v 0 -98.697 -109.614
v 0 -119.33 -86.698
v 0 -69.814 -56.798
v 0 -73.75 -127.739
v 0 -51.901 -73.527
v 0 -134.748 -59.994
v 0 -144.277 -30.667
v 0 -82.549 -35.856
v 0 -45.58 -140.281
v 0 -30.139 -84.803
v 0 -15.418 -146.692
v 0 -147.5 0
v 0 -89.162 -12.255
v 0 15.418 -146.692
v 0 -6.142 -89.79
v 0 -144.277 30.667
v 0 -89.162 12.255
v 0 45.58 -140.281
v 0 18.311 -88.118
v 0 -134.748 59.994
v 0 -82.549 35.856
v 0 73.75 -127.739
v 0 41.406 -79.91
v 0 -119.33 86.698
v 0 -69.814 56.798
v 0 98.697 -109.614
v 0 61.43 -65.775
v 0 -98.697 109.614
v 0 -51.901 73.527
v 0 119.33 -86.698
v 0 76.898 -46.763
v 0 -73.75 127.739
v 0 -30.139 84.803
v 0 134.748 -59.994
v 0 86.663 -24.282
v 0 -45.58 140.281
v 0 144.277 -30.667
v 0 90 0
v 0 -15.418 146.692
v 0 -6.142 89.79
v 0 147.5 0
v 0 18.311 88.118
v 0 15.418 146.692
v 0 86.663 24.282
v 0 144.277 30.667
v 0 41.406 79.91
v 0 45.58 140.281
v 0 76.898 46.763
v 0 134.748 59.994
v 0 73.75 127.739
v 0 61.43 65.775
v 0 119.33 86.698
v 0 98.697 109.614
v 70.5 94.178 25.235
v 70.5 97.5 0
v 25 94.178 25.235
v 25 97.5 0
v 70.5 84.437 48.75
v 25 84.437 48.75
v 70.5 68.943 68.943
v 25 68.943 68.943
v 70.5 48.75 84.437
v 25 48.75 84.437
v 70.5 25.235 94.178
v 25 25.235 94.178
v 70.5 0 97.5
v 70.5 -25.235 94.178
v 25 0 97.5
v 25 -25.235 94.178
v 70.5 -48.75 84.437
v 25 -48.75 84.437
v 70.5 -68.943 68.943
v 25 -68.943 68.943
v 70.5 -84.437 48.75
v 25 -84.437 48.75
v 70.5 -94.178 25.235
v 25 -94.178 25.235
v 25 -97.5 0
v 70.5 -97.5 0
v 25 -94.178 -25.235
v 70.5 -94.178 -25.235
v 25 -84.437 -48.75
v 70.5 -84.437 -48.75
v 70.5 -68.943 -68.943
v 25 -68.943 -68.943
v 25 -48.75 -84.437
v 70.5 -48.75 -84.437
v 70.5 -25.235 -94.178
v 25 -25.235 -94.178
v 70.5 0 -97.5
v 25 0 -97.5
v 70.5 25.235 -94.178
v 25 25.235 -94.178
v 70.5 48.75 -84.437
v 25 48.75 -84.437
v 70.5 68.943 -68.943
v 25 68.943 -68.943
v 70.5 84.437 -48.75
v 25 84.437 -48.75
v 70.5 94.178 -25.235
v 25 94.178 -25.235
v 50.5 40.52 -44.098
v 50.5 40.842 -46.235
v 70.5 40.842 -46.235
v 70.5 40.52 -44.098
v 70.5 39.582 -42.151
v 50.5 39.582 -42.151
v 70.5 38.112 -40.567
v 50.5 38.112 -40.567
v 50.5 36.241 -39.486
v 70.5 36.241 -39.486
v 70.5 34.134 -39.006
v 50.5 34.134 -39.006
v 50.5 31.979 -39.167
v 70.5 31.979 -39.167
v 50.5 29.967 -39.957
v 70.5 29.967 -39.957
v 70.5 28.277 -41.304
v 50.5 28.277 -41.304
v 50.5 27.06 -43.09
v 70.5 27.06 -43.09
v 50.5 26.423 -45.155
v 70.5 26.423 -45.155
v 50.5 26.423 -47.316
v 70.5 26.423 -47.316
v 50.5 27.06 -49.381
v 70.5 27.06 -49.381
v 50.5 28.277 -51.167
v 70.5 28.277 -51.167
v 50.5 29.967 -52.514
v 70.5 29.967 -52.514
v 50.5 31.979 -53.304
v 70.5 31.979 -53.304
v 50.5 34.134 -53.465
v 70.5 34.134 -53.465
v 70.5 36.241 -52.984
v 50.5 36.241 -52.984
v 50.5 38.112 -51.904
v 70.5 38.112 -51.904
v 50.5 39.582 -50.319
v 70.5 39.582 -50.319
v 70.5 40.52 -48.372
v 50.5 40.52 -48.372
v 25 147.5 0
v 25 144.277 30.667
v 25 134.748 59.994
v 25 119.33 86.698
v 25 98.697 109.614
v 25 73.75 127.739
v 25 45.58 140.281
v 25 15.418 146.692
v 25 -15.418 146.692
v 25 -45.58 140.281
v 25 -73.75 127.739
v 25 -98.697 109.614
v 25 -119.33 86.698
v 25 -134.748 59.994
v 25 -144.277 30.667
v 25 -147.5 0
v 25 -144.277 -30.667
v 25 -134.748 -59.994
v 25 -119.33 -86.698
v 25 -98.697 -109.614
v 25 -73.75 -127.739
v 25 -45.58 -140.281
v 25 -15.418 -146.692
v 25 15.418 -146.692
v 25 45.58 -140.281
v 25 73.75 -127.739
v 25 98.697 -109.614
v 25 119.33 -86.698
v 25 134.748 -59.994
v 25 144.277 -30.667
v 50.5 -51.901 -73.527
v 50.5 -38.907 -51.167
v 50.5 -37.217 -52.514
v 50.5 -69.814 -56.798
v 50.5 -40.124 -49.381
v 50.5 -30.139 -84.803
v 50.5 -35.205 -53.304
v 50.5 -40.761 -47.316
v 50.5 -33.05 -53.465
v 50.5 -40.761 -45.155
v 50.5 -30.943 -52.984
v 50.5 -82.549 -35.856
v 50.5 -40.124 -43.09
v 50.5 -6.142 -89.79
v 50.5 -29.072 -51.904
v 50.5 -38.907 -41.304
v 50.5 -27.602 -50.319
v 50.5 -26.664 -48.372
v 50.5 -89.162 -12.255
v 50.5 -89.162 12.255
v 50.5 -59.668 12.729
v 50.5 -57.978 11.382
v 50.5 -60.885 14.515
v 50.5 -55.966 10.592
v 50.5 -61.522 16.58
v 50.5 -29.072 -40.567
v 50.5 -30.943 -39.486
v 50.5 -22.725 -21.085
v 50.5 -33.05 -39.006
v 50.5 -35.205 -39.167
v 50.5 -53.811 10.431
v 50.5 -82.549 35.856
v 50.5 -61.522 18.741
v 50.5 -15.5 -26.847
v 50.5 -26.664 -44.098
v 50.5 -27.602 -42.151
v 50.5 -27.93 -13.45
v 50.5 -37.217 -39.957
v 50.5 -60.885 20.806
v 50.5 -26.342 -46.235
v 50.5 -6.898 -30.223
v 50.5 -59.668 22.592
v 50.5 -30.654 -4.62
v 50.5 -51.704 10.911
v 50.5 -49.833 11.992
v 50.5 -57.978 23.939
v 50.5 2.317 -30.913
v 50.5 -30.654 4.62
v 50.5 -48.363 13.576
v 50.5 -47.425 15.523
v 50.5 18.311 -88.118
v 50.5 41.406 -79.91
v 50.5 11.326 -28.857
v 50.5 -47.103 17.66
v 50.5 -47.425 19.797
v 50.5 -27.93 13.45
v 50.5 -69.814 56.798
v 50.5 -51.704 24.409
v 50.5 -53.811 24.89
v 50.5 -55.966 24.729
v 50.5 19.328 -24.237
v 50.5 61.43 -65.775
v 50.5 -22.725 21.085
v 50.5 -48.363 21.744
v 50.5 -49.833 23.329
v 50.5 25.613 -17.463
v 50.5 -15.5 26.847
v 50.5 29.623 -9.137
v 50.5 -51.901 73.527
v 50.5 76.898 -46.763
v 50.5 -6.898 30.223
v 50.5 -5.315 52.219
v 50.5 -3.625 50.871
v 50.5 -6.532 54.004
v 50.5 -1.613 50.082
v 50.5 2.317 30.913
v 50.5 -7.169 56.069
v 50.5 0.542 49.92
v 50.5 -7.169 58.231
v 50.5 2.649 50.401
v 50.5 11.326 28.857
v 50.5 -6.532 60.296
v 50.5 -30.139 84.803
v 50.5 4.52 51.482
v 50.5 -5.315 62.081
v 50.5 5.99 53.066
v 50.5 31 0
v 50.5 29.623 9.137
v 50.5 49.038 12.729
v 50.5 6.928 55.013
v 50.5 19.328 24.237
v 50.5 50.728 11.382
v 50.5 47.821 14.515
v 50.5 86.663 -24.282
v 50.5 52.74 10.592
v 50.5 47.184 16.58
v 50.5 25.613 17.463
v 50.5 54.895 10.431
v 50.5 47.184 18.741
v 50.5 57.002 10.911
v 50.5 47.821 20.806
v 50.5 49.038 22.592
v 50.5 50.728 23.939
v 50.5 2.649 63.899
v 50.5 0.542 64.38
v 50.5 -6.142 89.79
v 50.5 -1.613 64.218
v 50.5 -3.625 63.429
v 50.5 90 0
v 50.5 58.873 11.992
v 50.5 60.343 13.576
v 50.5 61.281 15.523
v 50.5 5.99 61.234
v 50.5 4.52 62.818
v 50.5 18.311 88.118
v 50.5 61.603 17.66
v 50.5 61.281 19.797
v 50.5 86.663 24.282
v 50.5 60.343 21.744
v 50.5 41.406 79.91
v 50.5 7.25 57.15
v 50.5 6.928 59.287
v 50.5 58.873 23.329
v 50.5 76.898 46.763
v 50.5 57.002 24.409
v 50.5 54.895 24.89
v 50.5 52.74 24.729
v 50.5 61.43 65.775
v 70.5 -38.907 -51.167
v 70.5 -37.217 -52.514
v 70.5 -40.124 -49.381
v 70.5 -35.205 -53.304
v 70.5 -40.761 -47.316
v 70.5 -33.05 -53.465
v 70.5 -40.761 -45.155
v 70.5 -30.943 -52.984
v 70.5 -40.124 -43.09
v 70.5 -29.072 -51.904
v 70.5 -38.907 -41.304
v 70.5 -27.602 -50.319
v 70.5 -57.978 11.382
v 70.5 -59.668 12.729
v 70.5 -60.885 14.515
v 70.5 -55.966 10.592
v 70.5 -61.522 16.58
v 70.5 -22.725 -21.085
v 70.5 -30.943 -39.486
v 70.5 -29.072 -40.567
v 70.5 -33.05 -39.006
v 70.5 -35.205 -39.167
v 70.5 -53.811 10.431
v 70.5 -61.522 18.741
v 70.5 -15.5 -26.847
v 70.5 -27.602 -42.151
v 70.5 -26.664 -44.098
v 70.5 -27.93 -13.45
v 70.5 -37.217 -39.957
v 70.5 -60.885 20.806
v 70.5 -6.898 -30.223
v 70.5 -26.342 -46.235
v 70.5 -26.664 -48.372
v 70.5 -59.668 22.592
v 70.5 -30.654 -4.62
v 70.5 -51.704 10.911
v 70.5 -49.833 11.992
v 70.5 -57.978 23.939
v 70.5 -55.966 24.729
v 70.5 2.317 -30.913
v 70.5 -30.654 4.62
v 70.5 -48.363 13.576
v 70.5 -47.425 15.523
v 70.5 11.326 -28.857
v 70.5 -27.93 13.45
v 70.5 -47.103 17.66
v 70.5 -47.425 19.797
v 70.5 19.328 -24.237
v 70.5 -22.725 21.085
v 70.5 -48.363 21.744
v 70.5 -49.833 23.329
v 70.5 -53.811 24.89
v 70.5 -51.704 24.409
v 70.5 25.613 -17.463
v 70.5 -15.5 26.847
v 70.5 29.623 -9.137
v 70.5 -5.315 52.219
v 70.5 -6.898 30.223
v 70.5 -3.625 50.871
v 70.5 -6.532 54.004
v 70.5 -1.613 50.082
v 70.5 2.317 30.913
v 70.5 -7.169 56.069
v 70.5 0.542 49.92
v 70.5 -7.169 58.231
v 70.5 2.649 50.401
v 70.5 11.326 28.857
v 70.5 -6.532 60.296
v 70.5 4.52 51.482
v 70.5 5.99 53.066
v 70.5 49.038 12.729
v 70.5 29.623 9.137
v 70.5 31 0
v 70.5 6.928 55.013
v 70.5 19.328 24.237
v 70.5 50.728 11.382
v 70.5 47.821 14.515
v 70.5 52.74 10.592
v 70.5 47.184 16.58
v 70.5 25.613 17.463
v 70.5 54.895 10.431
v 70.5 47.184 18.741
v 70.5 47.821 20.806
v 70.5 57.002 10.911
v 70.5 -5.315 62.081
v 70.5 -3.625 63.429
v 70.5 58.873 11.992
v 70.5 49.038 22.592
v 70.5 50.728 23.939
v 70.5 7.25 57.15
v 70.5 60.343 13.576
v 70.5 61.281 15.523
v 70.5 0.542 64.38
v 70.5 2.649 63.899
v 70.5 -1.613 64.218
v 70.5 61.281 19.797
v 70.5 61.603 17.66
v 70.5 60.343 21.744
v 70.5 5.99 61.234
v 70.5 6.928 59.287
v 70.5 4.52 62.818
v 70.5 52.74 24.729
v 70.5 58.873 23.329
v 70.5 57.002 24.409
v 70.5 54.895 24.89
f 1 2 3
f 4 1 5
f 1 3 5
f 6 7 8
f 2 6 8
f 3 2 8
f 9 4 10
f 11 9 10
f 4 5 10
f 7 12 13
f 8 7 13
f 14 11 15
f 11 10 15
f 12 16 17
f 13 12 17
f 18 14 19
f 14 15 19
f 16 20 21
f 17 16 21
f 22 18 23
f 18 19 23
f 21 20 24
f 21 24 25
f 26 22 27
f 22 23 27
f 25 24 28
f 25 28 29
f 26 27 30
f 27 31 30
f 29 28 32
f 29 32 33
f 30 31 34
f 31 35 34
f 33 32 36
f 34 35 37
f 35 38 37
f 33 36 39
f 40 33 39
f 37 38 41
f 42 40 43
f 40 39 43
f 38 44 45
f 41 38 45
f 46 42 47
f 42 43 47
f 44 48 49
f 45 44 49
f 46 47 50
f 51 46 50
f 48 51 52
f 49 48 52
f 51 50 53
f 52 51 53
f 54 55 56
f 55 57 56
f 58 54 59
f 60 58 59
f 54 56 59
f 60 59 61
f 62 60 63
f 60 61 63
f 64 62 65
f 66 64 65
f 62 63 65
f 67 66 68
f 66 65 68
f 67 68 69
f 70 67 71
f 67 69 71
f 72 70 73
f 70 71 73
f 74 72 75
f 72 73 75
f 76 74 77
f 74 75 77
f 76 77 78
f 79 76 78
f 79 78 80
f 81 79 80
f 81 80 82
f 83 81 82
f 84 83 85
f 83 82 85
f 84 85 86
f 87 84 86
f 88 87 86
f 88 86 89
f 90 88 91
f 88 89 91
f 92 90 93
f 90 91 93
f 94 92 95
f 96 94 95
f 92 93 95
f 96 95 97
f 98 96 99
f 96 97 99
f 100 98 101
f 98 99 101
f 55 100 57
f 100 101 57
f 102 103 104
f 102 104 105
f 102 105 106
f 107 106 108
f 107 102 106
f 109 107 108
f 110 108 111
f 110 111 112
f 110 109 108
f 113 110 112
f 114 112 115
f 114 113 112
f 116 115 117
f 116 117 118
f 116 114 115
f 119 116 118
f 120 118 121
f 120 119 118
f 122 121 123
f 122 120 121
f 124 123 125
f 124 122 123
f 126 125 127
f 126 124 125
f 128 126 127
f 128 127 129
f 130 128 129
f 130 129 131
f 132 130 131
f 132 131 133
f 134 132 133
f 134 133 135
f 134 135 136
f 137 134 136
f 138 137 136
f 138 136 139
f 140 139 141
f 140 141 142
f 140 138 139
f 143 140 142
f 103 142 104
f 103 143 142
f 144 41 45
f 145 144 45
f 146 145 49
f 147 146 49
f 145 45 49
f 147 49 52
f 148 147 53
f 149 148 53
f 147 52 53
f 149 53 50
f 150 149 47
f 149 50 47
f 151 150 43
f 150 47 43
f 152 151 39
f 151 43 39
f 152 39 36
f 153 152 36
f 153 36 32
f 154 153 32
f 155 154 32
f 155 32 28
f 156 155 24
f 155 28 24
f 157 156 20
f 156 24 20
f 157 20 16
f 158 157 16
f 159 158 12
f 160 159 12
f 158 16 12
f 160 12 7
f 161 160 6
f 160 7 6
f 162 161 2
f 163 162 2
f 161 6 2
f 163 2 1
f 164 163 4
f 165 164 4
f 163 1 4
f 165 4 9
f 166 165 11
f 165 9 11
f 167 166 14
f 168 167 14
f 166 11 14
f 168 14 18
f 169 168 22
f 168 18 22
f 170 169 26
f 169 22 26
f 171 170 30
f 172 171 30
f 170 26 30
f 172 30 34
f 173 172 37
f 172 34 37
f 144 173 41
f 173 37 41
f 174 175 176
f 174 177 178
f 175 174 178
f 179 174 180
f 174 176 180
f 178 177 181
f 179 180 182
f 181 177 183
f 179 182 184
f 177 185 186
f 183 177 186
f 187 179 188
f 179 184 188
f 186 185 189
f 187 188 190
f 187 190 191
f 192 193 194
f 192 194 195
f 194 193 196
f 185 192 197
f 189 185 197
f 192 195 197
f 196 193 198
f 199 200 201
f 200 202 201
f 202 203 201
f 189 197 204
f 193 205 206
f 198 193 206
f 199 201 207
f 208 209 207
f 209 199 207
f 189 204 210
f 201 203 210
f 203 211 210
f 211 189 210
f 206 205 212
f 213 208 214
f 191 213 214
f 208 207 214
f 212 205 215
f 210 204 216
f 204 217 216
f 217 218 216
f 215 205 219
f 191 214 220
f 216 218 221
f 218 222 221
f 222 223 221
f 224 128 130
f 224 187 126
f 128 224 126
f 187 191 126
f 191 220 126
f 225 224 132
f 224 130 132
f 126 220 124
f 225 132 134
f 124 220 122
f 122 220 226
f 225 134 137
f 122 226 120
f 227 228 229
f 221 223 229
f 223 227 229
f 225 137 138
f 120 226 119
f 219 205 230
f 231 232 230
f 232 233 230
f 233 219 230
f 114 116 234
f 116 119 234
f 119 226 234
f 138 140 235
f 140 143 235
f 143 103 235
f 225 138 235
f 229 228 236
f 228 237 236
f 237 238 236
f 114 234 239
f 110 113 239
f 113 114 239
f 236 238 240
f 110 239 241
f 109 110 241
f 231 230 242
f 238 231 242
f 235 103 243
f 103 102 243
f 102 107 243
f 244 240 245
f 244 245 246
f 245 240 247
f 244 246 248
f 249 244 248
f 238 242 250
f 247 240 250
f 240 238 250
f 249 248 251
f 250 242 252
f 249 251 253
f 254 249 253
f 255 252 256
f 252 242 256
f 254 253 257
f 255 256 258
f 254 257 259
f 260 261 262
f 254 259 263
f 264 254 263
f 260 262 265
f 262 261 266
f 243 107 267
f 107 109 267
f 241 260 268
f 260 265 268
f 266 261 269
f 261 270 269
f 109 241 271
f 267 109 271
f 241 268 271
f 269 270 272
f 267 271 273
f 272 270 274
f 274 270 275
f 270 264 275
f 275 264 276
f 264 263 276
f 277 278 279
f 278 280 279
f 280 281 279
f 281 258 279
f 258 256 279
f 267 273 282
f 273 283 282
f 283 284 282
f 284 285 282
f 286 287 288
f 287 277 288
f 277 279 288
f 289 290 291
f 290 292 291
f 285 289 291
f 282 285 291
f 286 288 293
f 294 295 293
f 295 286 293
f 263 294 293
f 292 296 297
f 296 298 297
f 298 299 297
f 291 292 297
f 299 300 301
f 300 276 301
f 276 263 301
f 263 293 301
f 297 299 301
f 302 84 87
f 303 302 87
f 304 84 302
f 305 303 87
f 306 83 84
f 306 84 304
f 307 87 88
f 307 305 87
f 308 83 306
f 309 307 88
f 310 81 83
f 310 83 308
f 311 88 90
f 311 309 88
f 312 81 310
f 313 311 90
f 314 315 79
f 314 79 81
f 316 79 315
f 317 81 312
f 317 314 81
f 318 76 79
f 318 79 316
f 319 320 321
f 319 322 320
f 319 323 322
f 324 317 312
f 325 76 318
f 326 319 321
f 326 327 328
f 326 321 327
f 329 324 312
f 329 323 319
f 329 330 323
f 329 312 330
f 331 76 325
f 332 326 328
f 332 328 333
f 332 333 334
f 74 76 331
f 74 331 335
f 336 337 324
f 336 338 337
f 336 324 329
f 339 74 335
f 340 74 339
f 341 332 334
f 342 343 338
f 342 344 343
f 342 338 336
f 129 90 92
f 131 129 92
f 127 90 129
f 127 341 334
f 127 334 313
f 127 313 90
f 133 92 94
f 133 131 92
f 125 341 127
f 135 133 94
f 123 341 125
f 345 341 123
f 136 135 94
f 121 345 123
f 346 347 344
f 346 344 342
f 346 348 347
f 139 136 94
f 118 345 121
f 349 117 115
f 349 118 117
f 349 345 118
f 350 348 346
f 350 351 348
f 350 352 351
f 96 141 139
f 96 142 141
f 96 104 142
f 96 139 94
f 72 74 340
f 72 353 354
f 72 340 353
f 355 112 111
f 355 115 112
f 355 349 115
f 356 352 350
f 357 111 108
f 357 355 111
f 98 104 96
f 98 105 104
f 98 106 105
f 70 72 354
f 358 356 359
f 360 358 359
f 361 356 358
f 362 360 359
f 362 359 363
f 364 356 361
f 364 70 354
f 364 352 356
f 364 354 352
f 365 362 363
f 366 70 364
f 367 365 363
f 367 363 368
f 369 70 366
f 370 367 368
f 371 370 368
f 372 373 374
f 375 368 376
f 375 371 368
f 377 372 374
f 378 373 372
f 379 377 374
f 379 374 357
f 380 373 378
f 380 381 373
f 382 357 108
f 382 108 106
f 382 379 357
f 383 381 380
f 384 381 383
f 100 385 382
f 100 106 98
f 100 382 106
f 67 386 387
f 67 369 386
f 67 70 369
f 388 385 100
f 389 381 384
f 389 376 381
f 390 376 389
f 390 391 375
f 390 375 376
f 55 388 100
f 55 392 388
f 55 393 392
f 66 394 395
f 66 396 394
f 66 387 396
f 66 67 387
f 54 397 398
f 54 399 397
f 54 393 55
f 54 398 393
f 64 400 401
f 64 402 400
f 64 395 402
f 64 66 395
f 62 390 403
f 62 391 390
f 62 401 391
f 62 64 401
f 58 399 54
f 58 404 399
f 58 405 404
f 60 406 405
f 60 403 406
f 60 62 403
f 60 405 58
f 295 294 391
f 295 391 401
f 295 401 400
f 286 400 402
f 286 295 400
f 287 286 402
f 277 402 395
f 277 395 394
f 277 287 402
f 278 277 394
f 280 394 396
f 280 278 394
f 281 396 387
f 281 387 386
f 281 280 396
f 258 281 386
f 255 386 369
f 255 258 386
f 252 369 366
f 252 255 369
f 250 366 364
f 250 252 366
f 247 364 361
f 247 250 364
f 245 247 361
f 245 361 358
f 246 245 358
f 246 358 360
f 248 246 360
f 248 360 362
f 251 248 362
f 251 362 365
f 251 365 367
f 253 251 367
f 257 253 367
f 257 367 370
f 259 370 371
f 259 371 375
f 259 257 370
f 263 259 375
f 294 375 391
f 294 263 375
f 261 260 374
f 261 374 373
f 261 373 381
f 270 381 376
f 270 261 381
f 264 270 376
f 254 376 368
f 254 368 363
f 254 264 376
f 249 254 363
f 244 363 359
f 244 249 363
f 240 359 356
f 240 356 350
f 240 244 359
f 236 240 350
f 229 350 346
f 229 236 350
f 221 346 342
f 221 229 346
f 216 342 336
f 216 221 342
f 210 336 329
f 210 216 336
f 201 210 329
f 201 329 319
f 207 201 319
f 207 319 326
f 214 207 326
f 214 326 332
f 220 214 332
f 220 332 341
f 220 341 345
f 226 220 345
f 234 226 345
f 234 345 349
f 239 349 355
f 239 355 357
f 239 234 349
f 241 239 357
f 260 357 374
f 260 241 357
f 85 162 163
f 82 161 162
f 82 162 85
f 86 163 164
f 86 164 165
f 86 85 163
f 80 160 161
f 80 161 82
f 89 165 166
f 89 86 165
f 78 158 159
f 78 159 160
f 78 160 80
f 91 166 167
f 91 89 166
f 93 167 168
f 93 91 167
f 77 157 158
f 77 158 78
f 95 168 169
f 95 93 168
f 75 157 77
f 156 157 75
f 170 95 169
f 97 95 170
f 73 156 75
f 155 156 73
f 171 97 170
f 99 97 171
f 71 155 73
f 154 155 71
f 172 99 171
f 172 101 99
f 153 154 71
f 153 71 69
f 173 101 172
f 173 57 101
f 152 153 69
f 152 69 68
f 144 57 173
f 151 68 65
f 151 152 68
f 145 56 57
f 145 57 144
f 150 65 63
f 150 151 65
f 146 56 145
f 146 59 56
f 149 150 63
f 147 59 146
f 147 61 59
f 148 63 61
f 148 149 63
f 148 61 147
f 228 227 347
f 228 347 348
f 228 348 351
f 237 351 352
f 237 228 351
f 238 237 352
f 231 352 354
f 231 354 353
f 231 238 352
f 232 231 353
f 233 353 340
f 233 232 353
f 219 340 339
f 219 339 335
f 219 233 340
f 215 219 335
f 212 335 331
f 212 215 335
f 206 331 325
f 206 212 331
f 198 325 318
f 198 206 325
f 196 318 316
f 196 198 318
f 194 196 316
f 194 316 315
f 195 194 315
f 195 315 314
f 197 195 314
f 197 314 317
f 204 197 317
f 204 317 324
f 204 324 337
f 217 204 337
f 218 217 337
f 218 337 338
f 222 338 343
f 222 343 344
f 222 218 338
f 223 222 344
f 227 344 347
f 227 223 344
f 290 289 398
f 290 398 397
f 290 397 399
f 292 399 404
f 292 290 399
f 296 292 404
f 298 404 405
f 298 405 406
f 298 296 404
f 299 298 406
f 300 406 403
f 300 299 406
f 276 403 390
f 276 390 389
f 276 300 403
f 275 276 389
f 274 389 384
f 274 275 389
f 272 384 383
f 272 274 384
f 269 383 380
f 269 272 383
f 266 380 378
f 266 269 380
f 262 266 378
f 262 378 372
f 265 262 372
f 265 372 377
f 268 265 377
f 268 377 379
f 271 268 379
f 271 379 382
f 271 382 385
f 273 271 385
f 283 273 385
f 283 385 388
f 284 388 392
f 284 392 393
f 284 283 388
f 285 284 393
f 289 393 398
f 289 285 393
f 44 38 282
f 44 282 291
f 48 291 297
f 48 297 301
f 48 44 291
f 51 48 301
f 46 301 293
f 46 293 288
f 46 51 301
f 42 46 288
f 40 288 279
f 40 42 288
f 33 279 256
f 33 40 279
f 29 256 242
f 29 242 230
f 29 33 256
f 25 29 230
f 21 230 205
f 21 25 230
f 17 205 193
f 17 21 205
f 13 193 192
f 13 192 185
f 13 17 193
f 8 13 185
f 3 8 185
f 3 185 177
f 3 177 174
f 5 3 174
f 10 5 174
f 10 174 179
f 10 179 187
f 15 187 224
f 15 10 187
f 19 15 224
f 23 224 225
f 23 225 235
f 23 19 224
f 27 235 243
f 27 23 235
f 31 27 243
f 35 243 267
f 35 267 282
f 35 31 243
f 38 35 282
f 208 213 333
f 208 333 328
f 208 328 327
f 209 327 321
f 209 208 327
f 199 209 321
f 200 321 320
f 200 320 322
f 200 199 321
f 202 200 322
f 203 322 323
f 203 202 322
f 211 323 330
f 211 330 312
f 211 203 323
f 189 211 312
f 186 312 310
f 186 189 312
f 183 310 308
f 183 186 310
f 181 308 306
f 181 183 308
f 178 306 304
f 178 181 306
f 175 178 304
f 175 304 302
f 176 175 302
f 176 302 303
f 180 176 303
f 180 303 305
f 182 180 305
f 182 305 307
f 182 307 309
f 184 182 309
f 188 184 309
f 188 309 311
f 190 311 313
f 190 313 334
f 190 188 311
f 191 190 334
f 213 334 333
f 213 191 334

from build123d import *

# Parameters (mm, degrees)
F0_R     = 147.5
F0_R_2   = 97.5
F1_DEPTH = 25
F0_R_3   = 90
F2_DEPTH = 50.5
F4_R     = 97.5
F4_R_2   = 7.25
F4_R_3   = 31
F5_DEPTH = 20


with BuildPart() as f1:
    # F0 (on Right) → F1 (new body)
    with BuildSketch(Plane.YZ):
        Circle(F0_R)
        Circle(F0_R_2, mode=Mode.SUBTRACT)
    extrude(amount=F1_DEPTH)

    # F0 (on Right) → F2 (join)
    with BuildSketch(Plane.YZ):
        Circle(F0_R_2)
        Circle(F0_R_3, mode=Mode.SUBTRACT)
    extrude(amount=F2_DEPTH)

    # F4 (on offset) → F5 (join)
    with BuildSketch(Plane.YZ.offset(50.5)):
        Circle(F4_R)
        with Locations((-33.591927, -46.235321)):
            Circle(F4_R_2, mode=Mode.SUBTRACT)
        with Locations((33.591927, -46.235321)):
            Circle(F4_R_2, mode=Mode.SUBTRACT)
        with Locations((-54.35288, 17.660321)):
            Circle(F4_R_2, mode=Mode.SUBTRACT)
        Circle(F4_R_3, mode=Mode.SUBTRACT)
        with Locations((54.35288, 17.660321)):
            Circle(F4_R_2, mode=Mode.SUBTRACT)
        with Locations((0, 57.15)):
            Circle(F4_R_2, mode=Mode.SUBTRACT)
    extrude(amount=F5_DEPTH)


solid = f1.part
